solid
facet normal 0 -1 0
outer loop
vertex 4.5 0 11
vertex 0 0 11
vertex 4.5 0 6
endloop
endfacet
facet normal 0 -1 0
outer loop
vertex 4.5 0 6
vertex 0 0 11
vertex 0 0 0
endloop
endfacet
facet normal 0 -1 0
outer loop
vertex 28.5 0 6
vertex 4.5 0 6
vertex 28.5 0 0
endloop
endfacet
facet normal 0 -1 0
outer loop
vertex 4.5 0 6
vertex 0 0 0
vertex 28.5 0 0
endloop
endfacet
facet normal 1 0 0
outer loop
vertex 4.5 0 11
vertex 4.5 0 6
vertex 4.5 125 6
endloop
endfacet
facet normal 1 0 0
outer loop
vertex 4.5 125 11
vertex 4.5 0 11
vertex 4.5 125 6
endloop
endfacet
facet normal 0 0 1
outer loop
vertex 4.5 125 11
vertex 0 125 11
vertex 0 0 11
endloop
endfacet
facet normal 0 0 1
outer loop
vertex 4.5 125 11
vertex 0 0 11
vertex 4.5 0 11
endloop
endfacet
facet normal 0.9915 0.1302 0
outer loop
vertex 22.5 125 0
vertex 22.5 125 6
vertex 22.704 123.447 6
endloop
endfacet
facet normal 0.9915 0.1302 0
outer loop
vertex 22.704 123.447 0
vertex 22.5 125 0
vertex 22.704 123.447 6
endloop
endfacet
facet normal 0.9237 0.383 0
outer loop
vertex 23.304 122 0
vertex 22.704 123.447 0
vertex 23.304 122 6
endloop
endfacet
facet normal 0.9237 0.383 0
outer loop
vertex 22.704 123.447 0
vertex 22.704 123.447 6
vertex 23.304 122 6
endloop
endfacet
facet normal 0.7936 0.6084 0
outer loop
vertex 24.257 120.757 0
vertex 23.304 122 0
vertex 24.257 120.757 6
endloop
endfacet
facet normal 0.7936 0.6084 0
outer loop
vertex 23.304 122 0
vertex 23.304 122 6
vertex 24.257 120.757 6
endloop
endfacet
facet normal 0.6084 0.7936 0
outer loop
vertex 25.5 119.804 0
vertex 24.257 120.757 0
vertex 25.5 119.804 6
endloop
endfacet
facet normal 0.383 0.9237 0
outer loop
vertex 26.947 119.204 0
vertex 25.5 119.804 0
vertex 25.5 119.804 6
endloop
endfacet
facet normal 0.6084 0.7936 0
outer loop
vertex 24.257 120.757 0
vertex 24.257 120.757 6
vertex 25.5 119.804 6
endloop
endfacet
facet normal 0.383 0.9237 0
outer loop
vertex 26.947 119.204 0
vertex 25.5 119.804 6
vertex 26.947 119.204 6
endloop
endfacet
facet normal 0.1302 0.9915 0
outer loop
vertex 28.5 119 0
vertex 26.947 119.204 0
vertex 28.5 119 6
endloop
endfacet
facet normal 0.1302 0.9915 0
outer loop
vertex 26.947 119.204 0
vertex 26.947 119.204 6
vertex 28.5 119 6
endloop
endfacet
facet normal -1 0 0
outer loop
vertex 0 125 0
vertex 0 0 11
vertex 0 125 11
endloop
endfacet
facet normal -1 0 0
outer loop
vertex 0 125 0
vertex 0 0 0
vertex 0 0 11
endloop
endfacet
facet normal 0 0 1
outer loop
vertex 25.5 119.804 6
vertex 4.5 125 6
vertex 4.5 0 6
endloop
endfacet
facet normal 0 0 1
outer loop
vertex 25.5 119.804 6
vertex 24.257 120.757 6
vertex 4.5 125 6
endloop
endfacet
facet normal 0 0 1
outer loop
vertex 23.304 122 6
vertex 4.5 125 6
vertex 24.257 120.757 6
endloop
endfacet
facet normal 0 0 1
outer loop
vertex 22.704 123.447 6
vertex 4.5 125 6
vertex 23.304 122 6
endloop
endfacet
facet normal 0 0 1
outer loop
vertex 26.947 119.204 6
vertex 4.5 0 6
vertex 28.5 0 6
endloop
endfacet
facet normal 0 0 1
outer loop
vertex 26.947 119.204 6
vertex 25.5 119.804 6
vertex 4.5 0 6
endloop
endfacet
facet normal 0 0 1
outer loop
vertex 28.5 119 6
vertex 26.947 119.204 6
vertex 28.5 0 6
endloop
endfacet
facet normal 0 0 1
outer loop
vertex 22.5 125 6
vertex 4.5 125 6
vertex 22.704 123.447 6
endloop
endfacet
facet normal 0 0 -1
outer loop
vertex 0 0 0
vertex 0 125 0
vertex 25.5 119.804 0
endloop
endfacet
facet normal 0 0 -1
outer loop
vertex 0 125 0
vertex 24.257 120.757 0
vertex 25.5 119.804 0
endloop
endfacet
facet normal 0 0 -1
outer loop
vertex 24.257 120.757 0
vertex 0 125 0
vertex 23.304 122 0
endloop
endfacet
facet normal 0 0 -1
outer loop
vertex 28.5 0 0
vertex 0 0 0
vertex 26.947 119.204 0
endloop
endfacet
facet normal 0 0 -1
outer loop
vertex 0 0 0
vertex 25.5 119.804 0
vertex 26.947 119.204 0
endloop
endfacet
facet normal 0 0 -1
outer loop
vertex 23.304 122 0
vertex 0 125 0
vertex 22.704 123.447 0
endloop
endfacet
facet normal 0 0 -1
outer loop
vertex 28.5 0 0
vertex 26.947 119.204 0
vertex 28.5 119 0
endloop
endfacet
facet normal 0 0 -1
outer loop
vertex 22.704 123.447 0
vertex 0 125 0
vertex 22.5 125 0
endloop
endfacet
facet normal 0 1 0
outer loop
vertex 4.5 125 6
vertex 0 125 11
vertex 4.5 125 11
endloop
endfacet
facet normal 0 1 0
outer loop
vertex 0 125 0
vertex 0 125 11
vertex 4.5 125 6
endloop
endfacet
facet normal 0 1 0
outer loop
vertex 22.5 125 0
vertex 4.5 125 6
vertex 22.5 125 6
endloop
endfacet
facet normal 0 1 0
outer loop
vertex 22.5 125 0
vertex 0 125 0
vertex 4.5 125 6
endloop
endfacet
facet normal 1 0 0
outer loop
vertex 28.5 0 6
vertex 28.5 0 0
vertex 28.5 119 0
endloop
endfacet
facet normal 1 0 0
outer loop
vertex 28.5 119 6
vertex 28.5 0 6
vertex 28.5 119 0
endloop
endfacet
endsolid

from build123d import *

# Parameters (mm, degrees)
CROQUIS1_W              = 28.5
CROQUIS1_H              = 125
SALIENTE_EXTRUIR1_DEPTH = 6
CROQUIS2_W              = 4.5
CROQUIS2_H              = 125
SALIENTE_EXTRUIR2_DEPTH = 5
CROQUIS3_R              = 6
CORTAR_EXTRUIR1_DEPTH   = 7


with BuildPart() as part:
    # Croquis1 → Saliente-Extruir1 (new body)
    with BuildSketch(Plane.XY):
        with Locations((14.25, 62.5)):
            Rectangle(CROQUIS1_W, CROQUIS1_H)
    extrude(amount=SALIENTE_EXTRUIR1_DEPTH)

    # Croquis2 → Saliente-Extruir2 (add)
    with BuildSketch(Plane.XY.offset(6)):
        with Locations((2.25, 62.5)):
            Rectangle(CROQUIS2_W, CROQUIS2_H)
    extrude(amount=SALIENTE_EXTRUIR2_DEPTH)

    # Croquis3 → Cortar-Extruir1 (cut, through all)
    with BuildSketch(Plane.XY.offset(6)):
        with Locations((28.5, 125)):
            Circle(CROQUIS3_R)
    extrude(amount=-CORTAR_EXTRUIR1_DEPTH, mode=Mode.SUBTRACT)


solid = part.part
